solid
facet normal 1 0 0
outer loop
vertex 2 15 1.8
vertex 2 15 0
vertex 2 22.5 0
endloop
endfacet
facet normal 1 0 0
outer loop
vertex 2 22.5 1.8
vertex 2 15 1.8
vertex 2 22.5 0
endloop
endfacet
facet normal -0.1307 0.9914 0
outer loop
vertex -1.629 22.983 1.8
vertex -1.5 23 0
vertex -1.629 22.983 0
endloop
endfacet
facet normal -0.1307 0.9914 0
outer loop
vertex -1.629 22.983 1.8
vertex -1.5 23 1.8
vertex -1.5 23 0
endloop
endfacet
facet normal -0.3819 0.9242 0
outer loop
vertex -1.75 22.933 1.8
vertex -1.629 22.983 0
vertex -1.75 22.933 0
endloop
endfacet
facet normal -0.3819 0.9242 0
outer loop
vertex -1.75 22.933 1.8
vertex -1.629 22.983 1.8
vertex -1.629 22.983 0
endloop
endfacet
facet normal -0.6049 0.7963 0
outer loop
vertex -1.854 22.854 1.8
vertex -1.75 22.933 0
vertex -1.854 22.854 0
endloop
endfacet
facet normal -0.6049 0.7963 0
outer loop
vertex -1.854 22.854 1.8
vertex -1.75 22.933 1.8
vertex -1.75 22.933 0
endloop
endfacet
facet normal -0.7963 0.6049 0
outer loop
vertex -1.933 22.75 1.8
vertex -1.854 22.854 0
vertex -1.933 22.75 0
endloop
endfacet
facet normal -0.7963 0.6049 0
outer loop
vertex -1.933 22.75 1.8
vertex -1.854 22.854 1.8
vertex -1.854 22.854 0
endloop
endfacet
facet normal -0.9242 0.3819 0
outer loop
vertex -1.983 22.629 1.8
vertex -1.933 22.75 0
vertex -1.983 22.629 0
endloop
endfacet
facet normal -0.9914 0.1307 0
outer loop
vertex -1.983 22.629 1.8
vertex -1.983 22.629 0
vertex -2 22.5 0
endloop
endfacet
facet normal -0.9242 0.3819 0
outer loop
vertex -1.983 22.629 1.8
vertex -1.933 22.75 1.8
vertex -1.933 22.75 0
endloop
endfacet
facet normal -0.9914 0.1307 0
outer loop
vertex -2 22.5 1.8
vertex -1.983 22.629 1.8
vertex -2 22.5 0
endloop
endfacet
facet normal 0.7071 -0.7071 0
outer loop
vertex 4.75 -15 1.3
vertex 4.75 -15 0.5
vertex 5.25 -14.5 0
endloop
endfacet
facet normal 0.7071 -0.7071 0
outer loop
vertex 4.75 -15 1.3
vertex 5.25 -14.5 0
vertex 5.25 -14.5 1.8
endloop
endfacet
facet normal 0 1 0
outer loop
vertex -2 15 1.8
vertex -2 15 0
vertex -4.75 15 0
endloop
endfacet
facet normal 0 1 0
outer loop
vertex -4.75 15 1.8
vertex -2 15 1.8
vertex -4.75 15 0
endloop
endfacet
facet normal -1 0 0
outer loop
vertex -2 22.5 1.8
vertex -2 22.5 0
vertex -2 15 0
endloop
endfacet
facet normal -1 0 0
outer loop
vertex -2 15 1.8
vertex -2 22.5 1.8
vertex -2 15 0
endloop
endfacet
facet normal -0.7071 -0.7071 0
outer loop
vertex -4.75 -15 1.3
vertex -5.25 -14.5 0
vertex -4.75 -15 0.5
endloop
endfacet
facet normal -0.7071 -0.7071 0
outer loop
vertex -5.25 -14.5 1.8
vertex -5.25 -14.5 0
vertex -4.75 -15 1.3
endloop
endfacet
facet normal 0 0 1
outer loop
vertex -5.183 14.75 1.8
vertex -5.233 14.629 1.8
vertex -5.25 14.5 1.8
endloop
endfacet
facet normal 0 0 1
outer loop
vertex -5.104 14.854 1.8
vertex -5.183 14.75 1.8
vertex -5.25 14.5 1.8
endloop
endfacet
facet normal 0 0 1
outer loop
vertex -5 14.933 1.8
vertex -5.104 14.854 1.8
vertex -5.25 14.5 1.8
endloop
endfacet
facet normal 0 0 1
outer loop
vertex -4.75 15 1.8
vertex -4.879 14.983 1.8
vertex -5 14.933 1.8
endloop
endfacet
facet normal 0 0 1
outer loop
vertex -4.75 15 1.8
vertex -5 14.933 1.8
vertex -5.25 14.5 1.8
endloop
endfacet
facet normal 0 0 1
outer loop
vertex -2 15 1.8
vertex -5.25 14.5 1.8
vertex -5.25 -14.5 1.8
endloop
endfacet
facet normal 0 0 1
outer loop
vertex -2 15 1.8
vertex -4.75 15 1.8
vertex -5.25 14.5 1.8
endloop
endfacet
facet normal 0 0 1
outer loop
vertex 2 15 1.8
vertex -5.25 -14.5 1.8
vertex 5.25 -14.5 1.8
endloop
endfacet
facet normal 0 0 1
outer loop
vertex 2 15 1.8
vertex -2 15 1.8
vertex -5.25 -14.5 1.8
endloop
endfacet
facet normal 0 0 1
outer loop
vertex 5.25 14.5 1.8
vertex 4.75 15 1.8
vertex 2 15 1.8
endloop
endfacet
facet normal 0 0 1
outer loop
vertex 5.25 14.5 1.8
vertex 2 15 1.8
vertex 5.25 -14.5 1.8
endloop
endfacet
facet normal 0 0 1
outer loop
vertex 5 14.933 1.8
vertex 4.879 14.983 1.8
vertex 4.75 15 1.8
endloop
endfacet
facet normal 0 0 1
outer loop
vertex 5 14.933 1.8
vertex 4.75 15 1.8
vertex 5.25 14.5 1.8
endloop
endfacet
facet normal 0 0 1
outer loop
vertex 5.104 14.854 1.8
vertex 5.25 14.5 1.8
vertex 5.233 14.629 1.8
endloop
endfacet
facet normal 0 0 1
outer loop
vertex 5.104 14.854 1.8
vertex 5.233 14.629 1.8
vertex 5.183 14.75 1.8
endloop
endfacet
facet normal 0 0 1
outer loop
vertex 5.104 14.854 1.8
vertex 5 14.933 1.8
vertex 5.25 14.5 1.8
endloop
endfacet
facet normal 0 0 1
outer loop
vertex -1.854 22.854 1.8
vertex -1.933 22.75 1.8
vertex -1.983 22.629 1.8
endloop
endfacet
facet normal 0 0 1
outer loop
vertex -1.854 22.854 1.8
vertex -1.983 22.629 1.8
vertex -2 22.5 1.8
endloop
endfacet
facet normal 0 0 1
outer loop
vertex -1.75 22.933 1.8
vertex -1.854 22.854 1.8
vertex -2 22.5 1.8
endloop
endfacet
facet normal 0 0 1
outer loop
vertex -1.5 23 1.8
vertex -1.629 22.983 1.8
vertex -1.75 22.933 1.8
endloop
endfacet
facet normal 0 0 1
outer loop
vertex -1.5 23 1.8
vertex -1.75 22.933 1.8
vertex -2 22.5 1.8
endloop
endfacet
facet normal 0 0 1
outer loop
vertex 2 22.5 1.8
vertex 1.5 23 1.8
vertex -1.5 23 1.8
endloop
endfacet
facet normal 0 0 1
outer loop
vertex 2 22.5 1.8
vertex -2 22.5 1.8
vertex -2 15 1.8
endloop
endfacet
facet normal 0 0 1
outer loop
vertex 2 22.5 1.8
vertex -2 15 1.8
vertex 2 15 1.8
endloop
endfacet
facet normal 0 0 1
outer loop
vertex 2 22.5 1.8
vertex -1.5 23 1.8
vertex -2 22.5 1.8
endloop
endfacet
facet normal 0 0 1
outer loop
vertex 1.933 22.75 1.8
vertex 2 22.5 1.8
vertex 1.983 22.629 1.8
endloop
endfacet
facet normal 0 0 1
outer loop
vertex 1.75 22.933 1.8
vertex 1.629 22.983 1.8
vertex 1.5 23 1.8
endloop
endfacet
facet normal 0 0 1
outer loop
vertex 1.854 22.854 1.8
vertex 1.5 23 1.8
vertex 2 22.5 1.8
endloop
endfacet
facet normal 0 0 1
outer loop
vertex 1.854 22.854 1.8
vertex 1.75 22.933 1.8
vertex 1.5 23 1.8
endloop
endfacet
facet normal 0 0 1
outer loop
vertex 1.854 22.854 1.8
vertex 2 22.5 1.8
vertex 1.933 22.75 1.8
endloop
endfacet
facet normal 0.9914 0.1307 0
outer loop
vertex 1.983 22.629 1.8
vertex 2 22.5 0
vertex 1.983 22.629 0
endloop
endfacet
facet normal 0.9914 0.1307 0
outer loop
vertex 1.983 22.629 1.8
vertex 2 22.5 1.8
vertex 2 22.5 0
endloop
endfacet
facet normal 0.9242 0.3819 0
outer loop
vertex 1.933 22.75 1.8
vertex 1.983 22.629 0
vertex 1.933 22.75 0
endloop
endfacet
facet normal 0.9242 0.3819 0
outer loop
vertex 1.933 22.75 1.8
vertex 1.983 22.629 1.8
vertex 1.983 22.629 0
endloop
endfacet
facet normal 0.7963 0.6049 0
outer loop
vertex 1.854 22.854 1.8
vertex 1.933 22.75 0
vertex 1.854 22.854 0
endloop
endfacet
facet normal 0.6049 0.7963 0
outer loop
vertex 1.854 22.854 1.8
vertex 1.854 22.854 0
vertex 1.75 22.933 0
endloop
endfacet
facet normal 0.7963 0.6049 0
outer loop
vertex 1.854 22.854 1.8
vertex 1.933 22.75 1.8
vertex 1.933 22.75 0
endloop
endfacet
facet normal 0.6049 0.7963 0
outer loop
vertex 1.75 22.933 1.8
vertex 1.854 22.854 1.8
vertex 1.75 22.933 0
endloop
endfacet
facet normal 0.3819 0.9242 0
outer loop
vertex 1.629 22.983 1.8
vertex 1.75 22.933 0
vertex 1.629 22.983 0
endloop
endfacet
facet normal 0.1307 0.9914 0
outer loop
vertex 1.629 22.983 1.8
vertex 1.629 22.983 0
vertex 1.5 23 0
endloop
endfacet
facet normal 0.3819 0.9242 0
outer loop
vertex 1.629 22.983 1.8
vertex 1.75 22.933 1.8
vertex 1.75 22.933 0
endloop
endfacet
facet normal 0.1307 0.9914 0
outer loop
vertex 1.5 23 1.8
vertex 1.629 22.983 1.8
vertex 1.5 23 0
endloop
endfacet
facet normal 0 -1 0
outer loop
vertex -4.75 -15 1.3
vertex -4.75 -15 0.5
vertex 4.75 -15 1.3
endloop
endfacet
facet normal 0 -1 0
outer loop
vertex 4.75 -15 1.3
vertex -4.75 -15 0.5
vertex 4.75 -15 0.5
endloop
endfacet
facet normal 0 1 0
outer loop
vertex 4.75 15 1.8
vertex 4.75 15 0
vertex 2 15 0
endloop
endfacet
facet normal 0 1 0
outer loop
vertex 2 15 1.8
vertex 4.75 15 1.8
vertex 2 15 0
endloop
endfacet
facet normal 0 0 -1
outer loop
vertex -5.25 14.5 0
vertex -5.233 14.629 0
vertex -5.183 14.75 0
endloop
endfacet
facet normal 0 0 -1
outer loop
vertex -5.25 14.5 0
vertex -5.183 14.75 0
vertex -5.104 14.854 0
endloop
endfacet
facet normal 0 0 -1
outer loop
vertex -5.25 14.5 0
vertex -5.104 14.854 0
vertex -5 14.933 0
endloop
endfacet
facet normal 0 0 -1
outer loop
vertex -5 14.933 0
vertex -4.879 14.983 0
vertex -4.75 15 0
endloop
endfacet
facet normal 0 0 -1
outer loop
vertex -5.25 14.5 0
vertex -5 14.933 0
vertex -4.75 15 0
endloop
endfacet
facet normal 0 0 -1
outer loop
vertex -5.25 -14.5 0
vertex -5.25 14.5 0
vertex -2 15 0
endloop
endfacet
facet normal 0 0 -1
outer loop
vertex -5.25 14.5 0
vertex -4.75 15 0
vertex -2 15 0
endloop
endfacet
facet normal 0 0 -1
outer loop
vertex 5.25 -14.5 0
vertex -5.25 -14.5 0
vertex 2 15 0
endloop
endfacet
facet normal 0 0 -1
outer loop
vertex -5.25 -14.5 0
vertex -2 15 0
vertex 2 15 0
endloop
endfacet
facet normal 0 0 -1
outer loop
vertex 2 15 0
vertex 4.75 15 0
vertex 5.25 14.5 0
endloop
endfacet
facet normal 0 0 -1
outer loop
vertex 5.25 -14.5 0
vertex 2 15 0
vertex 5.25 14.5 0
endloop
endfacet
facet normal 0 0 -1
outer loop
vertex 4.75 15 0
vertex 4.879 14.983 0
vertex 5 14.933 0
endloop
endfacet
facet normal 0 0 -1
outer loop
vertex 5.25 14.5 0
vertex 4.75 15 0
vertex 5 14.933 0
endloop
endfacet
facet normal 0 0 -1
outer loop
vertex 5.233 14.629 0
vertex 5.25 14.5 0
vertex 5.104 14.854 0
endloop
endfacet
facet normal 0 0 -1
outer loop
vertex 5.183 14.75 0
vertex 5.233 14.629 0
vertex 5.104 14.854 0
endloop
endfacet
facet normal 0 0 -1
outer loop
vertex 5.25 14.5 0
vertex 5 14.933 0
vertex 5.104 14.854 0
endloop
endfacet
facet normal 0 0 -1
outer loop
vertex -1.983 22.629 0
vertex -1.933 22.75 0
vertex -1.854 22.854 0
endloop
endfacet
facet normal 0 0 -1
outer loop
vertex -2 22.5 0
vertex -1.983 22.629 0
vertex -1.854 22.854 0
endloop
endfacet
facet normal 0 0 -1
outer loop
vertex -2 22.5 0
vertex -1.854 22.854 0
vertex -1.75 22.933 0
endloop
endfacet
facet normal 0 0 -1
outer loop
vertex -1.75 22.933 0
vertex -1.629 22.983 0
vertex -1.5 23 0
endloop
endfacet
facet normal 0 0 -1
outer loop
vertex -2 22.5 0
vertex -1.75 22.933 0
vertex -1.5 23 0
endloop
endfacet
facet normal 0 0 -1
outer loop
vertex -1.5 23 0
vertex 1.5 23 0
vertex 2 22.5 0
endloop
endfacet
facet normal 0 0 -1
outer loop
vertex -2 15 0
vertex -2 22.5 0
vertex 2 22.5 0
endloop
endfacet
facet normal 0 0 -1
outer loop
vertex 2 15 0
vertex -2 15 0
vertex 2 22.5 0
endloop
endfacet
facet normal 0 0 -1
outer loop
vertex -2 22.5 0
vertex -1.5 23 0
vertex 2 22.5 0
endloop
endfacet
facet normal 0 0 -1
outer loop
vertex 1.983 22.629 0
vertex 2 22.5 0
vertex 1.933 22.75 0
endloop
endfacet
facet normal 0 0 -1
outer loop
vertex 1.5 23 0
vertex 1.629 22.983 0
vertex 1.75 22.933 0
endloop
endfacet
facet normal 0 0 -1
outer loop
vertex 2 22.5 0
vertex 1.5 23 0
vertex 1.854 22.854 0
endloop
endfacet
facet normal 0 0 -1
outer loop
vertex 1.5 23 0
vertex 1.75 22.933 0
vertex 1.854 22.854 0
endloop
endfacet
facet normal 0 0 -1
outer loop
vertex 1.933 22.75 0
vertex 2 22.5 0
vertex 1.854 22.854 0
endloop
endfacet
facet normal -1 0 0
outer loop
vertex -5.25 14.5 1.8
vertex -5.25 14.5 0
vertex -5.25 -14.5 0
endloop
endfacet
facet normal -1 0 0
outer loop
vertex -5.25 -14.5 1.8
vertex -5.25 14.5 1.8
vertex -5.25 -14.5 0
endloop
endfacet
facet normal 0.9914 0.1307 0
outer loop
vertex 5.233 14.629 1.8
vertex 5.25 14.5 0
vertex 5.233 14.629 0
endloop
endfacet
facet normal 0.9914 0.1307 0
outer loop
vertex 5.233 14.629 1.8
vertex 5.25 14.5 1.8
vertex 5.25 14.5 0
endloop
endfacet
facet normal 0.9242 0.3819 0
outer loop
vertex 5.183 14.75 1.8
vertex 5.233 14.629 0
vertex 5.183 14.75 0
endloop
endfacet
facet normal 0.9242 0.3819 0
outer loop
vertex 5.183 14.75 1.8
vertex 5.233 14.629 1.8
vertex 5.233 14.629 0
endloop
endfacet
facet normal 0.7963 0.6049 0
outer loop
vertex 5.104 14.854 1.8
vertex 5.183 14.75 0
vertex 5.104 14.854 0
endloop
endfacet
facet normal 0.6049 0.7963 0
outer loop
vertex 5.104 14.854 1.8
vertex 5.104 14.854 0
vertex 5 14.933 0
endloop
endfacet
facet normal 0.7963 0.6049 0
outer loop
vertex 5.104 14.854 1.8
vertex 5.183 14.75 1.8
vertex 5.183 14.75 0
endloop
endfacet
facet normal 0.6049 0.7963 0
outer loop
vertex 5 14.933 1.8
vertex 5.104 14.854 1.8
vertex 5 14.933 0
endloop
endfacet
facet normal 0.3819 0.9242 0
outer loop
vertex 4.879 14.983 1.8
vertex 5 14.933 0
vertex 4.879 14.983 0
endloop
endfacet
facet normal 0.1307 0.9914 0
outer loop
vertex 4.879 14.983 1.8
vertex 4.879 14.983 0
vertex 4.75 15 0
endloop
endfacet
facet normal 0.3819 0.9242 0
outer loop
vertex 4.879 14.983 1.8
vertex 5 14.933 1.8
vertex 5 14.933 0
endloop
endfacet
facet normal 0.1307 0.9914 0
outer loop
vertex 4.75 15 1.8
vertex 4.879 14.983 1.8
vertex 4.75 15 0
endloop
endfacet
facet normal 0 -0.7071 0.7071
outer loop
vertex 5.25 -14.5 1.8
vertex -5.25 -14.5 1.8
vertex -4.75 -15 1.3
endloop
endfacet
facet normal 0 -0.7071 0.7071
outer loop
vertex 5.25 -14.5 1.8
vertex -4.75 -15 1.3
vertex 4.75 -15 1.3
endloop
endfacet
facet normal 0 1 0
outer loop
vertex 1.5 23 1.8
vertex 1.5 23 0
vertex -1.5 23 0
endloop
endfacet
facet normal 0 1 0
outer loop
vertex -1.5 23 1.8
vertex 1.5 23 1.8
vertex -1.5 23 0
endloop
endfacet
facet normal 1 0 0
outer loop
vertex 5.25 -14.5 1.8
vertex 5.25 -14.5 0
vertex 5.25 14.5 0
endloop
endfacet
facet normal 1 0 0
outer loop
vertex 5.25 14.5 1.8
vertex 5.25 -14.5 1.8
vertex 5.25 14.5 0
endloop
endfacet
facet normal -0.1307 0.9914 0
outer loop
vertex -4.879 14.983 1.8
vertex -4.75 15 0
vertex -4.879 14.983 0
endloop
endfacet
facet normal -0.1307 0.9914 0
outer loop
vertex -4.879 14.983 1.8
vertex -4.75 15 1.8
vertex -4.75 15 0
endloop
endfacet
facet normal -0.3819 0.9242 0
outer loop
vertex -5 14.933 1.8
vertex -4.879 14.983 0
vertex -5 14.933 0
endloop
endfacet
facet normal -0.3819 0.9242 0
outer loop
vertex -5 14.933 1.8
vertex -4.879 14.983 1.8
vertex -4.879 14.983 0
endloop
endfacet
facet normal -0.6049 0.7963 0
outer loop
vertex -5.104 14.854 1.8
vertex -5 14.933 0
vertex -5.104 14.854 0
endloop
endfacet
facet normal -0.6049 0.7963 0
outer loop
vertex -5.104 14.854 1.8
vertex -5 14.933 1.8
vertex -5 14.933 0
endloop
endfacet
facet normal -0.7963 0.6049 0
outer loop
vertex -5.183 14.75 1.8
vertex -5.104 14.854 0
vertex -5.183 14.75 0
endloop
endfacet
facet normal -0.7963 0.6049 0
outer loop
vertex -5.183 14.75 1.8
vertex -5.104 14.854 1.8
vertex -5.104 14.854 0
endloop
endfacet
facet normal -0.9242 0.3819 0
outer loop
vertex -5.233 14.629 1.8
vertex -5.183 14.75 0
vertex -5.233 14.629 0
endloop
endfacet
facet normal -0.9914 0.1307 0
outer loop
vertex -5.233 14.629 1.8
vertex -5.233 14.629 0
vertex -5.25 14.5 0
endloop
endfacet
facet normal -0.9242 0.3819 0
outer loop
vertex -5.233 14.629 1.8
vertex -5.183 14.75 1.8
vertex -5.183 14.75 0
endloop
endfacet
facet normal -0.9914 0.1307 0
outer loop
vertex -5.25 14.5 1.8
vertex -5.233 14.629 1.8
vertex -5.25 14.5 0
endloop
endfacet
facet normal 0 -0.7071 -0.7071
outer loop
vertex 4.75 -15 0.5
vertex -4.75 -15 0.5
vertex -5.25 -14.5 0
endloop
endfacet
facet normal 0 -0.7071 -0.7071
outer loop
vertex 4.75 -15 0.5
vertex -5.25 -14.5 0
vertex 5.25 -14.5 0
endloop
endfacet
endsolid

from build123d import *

# Parameters (mm, degrees)
F1_DEPTH = 1.8
F2_R     = 0.5
F3_SIZE  = 0.5


with BuildPart() as f1:
    # F0 (on Top) → F1 (new body)
    with BuildSketch(Plane.XY):
        Polygon((-5.25, -15), (5.25, -15), (5.25, 15), (2, 15), (2, 23), (0, 23), (-2, 23), (-2, 15), (-5.25, 15), align=None)
    extrude(amount=F1_DEPTH)

    # F2
    f2_edges = [f1.edges().sort_by_distance(p)[0] for p in [
        (2, 23, 0.9),
        (-2, 23, 0.9),
        (5.25, 15, 0.9),
        (-5.25, 15, 0.9),
    ]]
    fillet(f2_edges, radius=F2_R)

    # F3
    f3_edges = [f1.edges().sort_by_distance(p)[0] for p in [
        (0, -15, 0),
        (0, -15, 1.8),
        (5.25, -15, 0.9),
        (-5.25, -15, 0.9),
    ]]
    chamfer(f3_edges, length=F3_SIZE)


solid = f1.part
